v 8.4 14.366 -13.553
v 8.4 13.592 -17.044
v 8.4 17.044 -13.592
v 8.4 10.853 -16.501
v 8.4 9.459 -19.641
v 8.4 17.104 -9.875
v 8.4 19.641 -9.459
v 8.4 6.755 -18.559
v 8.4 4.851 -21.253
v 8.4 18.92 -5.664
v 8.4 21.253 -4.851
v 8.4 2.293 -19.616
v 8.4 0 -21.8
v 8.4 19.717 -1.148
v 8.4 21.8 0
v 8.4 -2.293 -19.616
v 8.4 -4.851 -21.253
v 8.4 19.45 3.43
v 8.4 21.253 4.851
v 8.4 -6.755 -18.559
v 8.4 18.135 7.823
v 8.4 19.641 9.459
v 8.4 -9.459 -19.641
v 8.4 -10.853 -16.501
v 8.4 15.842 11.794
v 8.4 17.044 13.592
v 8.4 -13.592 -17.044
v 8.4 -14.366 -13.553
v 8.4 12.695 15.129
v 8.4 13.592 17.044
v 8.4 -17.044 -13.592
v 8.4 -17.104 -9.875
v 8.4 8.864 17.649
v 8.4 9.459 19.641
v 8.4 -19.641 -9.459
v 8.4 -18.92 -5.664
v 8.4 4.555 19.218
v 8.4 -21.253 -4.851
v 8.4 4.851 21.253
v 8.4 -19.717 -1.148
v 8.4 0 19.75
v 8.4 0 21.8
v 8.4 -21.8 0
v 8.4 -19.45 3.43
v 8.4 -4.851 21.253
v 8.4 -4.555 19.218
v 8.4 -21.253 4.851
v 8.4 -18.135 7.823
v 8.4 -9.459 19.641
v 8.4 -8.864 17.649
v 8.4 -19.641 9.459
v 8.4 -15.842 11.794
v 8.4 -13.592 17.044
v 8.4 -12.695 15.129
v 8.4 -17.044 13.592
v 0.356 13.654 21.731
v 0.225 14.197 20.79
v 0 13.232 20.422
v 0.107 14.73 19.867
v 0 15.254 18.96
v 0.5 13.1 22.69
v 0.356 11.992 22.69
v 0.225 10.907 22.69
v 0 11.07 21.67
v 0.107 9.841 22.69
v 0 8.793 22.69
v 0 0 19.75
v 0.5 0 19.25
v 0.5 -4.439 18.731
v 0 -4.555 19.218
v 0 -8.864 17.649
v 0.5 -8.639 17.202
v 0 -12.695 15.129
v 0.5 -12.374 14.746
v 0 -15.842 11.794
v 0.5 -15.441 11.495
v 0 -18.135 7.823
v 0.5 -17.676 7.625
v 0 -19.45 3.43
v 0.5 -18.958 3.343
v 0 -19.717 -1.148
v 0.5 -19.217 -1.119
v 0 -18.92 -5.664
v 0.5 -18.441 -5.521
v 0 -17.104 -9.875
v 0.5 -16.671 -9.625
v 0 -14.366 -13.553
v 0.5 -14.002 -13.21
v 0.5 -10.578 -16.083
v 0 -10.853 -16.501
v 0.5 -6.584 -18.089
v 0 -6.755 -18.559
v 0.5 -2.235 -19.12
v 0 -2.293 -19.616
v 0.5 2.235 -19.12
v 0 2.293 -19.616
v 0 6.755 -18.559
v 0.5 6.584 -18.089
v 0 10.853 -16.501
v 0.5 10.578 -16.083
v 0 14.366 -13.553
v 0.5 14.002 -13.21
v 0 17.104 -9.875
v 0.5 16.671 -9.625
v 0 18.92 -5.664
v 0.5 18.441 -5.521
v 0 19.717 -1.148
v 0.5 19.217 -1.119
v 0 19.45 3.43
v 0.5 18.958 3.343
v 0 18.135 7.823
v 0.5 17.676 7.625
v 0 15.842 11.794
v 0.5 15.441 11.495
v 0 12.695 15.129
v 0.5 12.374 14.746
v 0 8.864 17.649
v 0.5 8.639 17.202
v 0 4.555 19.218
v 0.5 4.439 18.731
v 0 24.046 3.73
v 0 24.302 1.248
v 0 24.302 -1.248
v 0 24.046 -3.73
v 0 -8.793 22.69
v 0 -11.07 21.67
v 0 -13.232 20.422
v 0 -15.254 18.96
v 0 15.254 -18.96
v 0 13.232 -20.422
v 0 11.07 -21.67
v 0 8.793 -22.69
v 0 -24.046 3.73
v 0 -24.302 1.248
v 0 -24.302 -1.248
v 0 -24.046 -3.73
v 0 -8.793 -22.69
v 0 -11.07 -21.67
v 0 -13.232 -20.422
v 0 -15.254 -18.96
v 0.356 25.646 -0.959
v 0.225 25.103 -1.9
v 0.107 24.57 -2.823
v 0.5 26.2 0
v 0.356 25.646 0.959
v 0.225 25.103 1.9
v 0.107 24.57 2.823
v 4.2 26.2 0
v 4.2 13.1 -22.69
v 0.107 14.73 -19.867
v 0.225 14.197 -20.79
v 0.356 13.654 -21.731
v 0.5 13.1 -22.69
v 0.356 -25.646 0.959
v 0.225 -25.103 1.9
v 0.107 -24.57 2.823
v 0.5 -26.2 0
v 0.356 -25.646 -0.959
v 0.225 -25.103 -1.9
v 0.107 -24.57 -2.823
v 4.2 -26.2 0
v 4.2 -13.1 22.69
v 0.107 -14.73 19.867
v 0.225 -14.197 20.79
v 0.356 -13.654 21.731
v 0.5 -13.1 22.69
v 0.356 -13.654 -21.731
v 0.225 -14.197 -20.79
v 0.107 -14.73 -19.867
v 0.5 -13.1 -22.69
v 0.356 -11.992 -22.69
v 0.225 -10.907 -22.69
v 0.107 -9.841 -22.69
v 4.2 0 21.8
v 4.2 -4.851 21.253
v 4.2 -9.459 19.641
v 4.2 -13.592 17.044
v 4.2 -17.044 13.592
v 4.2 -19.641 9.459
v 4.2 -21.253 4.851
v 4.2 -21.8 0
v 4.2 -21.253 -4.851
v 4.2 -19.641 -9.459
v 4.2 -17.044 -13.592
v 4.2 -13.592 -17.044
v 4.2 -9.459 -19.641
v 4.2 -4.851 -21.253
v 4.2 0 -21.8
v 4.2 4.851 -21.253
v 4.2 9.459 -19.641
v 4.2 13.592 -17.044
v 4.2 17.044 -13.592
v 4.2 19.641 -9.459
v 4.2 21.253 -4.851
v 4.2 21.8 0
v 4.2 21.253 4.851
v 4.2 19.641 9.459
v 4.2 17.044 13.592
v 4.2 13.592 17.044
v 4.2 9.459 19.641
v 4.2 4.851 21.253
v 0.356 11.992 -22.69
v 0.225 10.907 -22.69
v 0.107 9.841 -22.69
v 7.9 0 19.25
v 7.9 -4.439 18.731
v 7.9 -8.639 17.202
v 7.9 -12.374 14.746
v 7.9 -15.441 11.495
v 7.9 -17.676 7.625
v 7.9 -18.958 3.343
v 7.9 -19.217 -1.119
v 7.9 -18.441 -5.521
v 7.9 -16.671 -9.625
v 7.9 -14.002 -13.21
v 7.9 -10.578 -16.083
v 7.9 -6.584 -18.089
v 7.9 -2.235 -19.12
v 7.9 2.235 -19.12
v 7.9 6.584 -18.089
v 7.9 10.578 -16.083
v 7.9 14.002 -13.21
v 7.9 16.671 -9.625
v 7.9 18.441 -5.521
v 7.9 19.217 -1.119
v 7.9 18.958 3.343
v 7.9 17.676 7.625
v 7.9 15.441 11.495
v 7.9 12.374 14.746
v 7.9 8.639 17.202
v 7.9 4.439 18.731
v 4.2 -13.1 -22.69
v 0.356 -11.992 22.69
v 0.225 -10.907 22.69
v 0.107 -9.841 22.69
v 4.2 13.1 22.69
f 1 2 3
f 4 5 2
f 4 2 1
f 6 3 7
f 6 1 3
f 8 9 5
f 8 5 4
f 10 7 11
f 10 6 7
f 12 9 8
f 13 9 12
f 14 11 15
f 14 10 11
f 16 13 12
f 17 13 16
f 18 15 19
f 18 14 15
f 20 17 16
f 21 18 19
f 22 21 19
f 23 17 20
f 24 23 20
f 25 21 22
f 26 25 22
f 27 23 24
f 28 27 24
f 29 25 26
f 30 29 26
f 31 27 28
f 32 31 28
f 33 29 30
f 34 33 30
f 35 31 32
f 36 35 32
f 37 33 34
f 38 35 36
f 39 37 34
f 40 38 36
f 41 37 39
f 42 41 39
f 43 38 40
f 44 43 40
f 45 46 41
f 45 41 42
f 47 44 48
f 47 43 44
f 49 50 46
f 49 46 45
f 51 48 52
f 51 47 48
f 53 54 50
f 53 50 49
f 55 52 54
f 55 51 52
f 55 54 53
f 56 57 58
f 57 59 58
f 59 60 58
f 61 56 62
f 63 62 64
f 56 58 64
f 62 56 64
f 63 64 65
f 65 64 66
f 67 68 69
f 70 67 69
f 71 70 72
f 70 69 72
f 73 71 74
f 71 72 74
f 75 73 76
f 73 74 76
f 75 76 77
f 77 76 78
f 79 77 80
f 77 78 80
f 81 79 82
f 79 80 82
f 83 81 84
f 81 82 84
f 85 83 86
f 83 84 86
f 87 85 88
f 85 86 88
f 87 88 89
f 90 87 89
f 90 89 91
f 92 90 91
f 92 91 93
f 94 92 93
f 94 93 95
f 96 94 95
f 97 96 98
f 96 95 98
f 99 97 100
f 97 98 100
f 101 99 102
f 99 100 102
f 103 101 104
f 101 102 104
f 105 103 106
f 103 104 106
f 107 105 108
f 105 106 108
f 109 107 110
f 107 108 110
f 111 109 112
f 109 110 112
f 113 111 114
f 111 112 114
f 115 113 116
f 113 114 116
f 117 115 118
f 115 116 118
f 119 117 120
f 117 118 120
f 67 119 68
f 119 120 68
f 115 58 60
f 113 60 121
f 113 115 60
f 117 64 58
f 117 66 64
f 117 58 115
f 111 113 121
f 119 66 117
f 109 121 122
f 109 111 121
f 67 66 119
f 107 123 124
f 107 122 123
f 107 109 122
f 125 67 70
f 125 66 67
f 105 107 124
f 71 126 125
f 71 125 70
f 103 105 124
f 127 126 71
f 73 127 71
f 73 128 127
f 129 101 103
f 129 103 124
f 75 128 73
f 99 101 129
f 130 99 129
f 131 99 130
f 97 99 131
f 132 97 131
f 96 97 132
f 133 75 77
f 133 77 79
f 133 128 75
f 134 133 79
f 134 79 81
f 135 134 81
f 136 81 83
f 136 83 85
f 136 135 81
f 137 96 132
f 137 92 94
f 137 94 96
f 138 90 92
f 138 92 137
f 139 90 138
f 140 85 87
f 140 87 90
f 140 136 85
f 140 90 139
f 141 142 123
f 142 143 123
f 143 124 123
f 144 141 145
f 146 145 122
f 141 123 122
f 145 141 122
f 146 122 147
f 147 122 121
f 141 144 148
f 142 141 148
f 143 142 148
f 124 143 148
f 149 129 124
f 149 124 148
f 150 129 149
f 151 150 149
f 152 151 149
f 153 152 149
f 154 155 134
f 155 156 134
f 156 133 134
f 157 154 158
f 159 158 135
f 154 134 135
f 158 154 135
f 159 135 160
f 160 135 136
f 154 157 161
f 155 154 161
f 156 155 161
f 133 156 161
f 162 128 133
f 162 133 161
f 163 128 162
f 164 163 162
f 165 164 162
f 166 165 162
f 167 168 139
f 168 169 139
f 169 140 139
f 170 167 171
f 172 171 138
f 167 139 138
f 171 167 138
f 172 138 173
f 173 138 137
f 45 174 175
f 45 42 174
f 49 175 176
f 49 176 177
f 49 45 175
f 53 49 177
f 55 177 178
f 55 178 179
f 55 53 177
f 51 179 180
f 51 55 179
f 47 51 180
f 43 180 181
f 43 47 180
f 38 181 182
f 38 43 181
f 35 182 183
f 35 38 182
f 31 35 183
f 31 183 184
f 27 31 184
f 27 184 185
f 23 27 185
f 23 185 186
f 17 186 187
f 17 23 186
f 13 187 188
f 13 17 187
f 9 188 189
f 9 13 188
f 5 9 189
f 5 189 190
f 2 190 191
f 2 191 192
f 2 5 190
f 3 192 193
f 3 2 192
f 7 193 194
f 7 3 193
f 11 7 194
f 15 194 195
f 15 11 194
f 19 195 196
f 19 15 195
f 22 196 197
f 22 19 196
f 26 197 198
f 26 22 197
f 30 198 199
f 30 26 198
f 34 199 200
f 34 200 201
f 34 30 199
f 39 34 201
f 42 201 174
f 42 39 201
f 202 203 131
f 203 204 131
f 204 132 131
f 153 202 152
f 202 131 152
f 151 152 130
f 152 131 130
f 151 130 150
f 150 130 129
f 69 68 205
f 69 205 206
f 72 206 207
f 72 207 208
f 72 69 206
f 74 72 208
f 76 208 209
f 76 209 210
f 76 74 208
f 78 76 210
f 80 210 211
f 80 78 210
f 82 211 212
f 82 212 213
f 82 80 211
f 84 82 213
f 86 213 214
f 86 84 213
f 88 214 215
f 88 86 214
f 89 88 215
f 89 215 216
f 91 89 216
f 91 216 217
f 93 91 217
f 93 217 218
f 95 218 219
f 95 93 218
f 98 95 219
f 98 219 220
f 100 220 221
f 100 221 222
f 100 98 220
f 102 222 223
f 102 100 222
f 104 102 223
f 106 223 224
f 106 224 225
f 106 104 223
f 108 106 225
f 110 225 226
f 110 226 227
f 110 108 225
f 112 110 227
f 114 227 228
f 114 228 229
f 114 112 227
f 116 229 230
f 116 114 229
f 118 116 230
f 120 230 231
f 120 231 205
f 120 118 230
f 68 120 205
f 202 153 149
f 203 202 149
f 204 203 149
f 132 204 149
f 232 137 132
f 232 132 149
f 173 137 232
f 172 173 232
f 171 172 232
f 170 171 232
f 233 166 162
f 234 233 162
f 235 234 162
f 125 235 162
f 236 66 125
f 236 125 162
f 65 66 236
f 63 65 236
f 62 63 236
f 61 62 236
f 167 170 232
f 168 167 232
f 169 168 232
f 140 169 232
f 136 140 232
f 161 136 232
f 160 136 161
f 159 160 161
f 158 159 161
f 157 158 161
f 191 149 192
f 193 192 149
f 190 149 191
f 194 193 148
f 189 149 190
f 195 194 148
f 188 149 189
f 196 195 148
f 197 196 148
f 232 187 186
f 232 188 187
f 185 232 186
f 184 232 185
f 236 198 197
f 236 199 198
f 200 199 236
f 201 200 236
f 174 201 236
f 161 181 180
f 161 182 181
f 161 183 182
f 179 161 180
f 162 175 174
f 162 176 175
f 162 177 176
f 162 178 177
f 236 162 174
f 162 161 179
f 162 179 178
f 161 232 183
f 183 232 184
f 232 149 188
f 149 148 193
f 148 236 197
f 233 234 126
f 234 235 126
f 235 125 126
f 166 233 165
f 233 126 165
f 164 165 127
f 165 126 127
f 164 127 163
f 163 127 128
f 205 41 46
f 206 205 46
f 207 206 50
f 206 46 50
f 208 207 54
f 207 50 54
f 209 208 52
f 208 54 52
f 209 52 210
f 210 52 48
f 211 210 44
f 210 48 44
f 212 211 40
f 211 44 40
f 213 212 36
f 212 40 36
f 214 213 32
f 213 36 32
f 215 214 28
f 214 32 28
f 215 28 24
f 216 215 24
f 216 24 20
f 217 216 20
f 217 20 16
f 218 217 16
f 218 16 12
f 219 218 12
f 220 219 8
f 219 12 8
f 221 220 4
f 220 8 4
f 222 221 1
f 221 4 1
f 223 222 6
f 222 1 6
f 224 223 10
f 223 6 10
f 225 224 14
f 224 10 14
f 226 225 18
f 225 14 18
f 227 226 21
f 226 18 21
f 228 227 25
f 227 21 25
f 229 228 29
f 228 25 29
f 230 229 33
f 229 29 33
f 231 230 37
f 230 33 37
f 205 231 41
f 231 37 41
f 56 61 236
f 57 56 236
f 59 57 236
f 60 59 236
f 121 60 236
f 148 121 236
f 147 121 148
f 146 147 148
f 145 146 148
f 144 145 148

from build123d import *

# Parameters (mm, degrees)
CHAMFER1_SIZE  = 0.5
CHAMFER1_SIZE2 = 1.866025404
SKETCH2_R      = 30.350258036
EXTRUDE1_DEPTH = 38.992630864
CHAMFER2_SIZE  = 0.5


with BuildPart() as part:
    # Sketch1 → Revolve1 (revolve)
    with BuildSketch(Plane.XY, mode=Mode.PRIVATE) as revolve1_sk:
        Polygon((0, 19.25), (0, 26.2), (4.2, 26.2), (4.2, 21.8), (8.4, 21.8), (8.4, 19.25), align=None)
    revolve(revolve1_sk.sketch.rotate(Axis((0, 0, 0), (1, 0, 0)), 90), axis=Axis((0, 0, 0), (1, 0, 0)))

    # Chamfer1
    chamfer1_edges = [part.edges().sort_by_distance(p)[0] for p in [
        (0, 0, -26.2),
    ]]
    chamfer1_side = [part.faces().sort_by_distance(p)[0] for p in [
        (2.1, 0, -26.2),
    ]]
    chamfer(chamfer1_edges, length=CHAMFER1_SIZE, length2=CHAMFER1_SIZE2, reference=chamfer1_side[0])

    # Sketch2 → Extrude1 (cut, through all)
    with BuildSketch(Plane.ZY):
        Circle(SKETCH2_R)
        Polygon((0, 26.2), (-22.689865579, 13.1), (-22.689865579, -13.1), (0, -26.2), (22.689865579, -13.1), (22.689865579, 13.1), align=None, mode=Mode.SUBTRACT)
    extrude(amount=-EXTRUDE1_DEPTH, mode=Mode.SUBTRACT)

    # Chamfer2
    chamfer2_edges = [part.edges().sort_by_distance(p)[0] for p in [
        (8.4, 0, -19.25),
        (0, 0, -19.25),
    ]]
    chamfer(chamfer2_edges, length=CHAMFER2_SIZE)


solid = part.part
